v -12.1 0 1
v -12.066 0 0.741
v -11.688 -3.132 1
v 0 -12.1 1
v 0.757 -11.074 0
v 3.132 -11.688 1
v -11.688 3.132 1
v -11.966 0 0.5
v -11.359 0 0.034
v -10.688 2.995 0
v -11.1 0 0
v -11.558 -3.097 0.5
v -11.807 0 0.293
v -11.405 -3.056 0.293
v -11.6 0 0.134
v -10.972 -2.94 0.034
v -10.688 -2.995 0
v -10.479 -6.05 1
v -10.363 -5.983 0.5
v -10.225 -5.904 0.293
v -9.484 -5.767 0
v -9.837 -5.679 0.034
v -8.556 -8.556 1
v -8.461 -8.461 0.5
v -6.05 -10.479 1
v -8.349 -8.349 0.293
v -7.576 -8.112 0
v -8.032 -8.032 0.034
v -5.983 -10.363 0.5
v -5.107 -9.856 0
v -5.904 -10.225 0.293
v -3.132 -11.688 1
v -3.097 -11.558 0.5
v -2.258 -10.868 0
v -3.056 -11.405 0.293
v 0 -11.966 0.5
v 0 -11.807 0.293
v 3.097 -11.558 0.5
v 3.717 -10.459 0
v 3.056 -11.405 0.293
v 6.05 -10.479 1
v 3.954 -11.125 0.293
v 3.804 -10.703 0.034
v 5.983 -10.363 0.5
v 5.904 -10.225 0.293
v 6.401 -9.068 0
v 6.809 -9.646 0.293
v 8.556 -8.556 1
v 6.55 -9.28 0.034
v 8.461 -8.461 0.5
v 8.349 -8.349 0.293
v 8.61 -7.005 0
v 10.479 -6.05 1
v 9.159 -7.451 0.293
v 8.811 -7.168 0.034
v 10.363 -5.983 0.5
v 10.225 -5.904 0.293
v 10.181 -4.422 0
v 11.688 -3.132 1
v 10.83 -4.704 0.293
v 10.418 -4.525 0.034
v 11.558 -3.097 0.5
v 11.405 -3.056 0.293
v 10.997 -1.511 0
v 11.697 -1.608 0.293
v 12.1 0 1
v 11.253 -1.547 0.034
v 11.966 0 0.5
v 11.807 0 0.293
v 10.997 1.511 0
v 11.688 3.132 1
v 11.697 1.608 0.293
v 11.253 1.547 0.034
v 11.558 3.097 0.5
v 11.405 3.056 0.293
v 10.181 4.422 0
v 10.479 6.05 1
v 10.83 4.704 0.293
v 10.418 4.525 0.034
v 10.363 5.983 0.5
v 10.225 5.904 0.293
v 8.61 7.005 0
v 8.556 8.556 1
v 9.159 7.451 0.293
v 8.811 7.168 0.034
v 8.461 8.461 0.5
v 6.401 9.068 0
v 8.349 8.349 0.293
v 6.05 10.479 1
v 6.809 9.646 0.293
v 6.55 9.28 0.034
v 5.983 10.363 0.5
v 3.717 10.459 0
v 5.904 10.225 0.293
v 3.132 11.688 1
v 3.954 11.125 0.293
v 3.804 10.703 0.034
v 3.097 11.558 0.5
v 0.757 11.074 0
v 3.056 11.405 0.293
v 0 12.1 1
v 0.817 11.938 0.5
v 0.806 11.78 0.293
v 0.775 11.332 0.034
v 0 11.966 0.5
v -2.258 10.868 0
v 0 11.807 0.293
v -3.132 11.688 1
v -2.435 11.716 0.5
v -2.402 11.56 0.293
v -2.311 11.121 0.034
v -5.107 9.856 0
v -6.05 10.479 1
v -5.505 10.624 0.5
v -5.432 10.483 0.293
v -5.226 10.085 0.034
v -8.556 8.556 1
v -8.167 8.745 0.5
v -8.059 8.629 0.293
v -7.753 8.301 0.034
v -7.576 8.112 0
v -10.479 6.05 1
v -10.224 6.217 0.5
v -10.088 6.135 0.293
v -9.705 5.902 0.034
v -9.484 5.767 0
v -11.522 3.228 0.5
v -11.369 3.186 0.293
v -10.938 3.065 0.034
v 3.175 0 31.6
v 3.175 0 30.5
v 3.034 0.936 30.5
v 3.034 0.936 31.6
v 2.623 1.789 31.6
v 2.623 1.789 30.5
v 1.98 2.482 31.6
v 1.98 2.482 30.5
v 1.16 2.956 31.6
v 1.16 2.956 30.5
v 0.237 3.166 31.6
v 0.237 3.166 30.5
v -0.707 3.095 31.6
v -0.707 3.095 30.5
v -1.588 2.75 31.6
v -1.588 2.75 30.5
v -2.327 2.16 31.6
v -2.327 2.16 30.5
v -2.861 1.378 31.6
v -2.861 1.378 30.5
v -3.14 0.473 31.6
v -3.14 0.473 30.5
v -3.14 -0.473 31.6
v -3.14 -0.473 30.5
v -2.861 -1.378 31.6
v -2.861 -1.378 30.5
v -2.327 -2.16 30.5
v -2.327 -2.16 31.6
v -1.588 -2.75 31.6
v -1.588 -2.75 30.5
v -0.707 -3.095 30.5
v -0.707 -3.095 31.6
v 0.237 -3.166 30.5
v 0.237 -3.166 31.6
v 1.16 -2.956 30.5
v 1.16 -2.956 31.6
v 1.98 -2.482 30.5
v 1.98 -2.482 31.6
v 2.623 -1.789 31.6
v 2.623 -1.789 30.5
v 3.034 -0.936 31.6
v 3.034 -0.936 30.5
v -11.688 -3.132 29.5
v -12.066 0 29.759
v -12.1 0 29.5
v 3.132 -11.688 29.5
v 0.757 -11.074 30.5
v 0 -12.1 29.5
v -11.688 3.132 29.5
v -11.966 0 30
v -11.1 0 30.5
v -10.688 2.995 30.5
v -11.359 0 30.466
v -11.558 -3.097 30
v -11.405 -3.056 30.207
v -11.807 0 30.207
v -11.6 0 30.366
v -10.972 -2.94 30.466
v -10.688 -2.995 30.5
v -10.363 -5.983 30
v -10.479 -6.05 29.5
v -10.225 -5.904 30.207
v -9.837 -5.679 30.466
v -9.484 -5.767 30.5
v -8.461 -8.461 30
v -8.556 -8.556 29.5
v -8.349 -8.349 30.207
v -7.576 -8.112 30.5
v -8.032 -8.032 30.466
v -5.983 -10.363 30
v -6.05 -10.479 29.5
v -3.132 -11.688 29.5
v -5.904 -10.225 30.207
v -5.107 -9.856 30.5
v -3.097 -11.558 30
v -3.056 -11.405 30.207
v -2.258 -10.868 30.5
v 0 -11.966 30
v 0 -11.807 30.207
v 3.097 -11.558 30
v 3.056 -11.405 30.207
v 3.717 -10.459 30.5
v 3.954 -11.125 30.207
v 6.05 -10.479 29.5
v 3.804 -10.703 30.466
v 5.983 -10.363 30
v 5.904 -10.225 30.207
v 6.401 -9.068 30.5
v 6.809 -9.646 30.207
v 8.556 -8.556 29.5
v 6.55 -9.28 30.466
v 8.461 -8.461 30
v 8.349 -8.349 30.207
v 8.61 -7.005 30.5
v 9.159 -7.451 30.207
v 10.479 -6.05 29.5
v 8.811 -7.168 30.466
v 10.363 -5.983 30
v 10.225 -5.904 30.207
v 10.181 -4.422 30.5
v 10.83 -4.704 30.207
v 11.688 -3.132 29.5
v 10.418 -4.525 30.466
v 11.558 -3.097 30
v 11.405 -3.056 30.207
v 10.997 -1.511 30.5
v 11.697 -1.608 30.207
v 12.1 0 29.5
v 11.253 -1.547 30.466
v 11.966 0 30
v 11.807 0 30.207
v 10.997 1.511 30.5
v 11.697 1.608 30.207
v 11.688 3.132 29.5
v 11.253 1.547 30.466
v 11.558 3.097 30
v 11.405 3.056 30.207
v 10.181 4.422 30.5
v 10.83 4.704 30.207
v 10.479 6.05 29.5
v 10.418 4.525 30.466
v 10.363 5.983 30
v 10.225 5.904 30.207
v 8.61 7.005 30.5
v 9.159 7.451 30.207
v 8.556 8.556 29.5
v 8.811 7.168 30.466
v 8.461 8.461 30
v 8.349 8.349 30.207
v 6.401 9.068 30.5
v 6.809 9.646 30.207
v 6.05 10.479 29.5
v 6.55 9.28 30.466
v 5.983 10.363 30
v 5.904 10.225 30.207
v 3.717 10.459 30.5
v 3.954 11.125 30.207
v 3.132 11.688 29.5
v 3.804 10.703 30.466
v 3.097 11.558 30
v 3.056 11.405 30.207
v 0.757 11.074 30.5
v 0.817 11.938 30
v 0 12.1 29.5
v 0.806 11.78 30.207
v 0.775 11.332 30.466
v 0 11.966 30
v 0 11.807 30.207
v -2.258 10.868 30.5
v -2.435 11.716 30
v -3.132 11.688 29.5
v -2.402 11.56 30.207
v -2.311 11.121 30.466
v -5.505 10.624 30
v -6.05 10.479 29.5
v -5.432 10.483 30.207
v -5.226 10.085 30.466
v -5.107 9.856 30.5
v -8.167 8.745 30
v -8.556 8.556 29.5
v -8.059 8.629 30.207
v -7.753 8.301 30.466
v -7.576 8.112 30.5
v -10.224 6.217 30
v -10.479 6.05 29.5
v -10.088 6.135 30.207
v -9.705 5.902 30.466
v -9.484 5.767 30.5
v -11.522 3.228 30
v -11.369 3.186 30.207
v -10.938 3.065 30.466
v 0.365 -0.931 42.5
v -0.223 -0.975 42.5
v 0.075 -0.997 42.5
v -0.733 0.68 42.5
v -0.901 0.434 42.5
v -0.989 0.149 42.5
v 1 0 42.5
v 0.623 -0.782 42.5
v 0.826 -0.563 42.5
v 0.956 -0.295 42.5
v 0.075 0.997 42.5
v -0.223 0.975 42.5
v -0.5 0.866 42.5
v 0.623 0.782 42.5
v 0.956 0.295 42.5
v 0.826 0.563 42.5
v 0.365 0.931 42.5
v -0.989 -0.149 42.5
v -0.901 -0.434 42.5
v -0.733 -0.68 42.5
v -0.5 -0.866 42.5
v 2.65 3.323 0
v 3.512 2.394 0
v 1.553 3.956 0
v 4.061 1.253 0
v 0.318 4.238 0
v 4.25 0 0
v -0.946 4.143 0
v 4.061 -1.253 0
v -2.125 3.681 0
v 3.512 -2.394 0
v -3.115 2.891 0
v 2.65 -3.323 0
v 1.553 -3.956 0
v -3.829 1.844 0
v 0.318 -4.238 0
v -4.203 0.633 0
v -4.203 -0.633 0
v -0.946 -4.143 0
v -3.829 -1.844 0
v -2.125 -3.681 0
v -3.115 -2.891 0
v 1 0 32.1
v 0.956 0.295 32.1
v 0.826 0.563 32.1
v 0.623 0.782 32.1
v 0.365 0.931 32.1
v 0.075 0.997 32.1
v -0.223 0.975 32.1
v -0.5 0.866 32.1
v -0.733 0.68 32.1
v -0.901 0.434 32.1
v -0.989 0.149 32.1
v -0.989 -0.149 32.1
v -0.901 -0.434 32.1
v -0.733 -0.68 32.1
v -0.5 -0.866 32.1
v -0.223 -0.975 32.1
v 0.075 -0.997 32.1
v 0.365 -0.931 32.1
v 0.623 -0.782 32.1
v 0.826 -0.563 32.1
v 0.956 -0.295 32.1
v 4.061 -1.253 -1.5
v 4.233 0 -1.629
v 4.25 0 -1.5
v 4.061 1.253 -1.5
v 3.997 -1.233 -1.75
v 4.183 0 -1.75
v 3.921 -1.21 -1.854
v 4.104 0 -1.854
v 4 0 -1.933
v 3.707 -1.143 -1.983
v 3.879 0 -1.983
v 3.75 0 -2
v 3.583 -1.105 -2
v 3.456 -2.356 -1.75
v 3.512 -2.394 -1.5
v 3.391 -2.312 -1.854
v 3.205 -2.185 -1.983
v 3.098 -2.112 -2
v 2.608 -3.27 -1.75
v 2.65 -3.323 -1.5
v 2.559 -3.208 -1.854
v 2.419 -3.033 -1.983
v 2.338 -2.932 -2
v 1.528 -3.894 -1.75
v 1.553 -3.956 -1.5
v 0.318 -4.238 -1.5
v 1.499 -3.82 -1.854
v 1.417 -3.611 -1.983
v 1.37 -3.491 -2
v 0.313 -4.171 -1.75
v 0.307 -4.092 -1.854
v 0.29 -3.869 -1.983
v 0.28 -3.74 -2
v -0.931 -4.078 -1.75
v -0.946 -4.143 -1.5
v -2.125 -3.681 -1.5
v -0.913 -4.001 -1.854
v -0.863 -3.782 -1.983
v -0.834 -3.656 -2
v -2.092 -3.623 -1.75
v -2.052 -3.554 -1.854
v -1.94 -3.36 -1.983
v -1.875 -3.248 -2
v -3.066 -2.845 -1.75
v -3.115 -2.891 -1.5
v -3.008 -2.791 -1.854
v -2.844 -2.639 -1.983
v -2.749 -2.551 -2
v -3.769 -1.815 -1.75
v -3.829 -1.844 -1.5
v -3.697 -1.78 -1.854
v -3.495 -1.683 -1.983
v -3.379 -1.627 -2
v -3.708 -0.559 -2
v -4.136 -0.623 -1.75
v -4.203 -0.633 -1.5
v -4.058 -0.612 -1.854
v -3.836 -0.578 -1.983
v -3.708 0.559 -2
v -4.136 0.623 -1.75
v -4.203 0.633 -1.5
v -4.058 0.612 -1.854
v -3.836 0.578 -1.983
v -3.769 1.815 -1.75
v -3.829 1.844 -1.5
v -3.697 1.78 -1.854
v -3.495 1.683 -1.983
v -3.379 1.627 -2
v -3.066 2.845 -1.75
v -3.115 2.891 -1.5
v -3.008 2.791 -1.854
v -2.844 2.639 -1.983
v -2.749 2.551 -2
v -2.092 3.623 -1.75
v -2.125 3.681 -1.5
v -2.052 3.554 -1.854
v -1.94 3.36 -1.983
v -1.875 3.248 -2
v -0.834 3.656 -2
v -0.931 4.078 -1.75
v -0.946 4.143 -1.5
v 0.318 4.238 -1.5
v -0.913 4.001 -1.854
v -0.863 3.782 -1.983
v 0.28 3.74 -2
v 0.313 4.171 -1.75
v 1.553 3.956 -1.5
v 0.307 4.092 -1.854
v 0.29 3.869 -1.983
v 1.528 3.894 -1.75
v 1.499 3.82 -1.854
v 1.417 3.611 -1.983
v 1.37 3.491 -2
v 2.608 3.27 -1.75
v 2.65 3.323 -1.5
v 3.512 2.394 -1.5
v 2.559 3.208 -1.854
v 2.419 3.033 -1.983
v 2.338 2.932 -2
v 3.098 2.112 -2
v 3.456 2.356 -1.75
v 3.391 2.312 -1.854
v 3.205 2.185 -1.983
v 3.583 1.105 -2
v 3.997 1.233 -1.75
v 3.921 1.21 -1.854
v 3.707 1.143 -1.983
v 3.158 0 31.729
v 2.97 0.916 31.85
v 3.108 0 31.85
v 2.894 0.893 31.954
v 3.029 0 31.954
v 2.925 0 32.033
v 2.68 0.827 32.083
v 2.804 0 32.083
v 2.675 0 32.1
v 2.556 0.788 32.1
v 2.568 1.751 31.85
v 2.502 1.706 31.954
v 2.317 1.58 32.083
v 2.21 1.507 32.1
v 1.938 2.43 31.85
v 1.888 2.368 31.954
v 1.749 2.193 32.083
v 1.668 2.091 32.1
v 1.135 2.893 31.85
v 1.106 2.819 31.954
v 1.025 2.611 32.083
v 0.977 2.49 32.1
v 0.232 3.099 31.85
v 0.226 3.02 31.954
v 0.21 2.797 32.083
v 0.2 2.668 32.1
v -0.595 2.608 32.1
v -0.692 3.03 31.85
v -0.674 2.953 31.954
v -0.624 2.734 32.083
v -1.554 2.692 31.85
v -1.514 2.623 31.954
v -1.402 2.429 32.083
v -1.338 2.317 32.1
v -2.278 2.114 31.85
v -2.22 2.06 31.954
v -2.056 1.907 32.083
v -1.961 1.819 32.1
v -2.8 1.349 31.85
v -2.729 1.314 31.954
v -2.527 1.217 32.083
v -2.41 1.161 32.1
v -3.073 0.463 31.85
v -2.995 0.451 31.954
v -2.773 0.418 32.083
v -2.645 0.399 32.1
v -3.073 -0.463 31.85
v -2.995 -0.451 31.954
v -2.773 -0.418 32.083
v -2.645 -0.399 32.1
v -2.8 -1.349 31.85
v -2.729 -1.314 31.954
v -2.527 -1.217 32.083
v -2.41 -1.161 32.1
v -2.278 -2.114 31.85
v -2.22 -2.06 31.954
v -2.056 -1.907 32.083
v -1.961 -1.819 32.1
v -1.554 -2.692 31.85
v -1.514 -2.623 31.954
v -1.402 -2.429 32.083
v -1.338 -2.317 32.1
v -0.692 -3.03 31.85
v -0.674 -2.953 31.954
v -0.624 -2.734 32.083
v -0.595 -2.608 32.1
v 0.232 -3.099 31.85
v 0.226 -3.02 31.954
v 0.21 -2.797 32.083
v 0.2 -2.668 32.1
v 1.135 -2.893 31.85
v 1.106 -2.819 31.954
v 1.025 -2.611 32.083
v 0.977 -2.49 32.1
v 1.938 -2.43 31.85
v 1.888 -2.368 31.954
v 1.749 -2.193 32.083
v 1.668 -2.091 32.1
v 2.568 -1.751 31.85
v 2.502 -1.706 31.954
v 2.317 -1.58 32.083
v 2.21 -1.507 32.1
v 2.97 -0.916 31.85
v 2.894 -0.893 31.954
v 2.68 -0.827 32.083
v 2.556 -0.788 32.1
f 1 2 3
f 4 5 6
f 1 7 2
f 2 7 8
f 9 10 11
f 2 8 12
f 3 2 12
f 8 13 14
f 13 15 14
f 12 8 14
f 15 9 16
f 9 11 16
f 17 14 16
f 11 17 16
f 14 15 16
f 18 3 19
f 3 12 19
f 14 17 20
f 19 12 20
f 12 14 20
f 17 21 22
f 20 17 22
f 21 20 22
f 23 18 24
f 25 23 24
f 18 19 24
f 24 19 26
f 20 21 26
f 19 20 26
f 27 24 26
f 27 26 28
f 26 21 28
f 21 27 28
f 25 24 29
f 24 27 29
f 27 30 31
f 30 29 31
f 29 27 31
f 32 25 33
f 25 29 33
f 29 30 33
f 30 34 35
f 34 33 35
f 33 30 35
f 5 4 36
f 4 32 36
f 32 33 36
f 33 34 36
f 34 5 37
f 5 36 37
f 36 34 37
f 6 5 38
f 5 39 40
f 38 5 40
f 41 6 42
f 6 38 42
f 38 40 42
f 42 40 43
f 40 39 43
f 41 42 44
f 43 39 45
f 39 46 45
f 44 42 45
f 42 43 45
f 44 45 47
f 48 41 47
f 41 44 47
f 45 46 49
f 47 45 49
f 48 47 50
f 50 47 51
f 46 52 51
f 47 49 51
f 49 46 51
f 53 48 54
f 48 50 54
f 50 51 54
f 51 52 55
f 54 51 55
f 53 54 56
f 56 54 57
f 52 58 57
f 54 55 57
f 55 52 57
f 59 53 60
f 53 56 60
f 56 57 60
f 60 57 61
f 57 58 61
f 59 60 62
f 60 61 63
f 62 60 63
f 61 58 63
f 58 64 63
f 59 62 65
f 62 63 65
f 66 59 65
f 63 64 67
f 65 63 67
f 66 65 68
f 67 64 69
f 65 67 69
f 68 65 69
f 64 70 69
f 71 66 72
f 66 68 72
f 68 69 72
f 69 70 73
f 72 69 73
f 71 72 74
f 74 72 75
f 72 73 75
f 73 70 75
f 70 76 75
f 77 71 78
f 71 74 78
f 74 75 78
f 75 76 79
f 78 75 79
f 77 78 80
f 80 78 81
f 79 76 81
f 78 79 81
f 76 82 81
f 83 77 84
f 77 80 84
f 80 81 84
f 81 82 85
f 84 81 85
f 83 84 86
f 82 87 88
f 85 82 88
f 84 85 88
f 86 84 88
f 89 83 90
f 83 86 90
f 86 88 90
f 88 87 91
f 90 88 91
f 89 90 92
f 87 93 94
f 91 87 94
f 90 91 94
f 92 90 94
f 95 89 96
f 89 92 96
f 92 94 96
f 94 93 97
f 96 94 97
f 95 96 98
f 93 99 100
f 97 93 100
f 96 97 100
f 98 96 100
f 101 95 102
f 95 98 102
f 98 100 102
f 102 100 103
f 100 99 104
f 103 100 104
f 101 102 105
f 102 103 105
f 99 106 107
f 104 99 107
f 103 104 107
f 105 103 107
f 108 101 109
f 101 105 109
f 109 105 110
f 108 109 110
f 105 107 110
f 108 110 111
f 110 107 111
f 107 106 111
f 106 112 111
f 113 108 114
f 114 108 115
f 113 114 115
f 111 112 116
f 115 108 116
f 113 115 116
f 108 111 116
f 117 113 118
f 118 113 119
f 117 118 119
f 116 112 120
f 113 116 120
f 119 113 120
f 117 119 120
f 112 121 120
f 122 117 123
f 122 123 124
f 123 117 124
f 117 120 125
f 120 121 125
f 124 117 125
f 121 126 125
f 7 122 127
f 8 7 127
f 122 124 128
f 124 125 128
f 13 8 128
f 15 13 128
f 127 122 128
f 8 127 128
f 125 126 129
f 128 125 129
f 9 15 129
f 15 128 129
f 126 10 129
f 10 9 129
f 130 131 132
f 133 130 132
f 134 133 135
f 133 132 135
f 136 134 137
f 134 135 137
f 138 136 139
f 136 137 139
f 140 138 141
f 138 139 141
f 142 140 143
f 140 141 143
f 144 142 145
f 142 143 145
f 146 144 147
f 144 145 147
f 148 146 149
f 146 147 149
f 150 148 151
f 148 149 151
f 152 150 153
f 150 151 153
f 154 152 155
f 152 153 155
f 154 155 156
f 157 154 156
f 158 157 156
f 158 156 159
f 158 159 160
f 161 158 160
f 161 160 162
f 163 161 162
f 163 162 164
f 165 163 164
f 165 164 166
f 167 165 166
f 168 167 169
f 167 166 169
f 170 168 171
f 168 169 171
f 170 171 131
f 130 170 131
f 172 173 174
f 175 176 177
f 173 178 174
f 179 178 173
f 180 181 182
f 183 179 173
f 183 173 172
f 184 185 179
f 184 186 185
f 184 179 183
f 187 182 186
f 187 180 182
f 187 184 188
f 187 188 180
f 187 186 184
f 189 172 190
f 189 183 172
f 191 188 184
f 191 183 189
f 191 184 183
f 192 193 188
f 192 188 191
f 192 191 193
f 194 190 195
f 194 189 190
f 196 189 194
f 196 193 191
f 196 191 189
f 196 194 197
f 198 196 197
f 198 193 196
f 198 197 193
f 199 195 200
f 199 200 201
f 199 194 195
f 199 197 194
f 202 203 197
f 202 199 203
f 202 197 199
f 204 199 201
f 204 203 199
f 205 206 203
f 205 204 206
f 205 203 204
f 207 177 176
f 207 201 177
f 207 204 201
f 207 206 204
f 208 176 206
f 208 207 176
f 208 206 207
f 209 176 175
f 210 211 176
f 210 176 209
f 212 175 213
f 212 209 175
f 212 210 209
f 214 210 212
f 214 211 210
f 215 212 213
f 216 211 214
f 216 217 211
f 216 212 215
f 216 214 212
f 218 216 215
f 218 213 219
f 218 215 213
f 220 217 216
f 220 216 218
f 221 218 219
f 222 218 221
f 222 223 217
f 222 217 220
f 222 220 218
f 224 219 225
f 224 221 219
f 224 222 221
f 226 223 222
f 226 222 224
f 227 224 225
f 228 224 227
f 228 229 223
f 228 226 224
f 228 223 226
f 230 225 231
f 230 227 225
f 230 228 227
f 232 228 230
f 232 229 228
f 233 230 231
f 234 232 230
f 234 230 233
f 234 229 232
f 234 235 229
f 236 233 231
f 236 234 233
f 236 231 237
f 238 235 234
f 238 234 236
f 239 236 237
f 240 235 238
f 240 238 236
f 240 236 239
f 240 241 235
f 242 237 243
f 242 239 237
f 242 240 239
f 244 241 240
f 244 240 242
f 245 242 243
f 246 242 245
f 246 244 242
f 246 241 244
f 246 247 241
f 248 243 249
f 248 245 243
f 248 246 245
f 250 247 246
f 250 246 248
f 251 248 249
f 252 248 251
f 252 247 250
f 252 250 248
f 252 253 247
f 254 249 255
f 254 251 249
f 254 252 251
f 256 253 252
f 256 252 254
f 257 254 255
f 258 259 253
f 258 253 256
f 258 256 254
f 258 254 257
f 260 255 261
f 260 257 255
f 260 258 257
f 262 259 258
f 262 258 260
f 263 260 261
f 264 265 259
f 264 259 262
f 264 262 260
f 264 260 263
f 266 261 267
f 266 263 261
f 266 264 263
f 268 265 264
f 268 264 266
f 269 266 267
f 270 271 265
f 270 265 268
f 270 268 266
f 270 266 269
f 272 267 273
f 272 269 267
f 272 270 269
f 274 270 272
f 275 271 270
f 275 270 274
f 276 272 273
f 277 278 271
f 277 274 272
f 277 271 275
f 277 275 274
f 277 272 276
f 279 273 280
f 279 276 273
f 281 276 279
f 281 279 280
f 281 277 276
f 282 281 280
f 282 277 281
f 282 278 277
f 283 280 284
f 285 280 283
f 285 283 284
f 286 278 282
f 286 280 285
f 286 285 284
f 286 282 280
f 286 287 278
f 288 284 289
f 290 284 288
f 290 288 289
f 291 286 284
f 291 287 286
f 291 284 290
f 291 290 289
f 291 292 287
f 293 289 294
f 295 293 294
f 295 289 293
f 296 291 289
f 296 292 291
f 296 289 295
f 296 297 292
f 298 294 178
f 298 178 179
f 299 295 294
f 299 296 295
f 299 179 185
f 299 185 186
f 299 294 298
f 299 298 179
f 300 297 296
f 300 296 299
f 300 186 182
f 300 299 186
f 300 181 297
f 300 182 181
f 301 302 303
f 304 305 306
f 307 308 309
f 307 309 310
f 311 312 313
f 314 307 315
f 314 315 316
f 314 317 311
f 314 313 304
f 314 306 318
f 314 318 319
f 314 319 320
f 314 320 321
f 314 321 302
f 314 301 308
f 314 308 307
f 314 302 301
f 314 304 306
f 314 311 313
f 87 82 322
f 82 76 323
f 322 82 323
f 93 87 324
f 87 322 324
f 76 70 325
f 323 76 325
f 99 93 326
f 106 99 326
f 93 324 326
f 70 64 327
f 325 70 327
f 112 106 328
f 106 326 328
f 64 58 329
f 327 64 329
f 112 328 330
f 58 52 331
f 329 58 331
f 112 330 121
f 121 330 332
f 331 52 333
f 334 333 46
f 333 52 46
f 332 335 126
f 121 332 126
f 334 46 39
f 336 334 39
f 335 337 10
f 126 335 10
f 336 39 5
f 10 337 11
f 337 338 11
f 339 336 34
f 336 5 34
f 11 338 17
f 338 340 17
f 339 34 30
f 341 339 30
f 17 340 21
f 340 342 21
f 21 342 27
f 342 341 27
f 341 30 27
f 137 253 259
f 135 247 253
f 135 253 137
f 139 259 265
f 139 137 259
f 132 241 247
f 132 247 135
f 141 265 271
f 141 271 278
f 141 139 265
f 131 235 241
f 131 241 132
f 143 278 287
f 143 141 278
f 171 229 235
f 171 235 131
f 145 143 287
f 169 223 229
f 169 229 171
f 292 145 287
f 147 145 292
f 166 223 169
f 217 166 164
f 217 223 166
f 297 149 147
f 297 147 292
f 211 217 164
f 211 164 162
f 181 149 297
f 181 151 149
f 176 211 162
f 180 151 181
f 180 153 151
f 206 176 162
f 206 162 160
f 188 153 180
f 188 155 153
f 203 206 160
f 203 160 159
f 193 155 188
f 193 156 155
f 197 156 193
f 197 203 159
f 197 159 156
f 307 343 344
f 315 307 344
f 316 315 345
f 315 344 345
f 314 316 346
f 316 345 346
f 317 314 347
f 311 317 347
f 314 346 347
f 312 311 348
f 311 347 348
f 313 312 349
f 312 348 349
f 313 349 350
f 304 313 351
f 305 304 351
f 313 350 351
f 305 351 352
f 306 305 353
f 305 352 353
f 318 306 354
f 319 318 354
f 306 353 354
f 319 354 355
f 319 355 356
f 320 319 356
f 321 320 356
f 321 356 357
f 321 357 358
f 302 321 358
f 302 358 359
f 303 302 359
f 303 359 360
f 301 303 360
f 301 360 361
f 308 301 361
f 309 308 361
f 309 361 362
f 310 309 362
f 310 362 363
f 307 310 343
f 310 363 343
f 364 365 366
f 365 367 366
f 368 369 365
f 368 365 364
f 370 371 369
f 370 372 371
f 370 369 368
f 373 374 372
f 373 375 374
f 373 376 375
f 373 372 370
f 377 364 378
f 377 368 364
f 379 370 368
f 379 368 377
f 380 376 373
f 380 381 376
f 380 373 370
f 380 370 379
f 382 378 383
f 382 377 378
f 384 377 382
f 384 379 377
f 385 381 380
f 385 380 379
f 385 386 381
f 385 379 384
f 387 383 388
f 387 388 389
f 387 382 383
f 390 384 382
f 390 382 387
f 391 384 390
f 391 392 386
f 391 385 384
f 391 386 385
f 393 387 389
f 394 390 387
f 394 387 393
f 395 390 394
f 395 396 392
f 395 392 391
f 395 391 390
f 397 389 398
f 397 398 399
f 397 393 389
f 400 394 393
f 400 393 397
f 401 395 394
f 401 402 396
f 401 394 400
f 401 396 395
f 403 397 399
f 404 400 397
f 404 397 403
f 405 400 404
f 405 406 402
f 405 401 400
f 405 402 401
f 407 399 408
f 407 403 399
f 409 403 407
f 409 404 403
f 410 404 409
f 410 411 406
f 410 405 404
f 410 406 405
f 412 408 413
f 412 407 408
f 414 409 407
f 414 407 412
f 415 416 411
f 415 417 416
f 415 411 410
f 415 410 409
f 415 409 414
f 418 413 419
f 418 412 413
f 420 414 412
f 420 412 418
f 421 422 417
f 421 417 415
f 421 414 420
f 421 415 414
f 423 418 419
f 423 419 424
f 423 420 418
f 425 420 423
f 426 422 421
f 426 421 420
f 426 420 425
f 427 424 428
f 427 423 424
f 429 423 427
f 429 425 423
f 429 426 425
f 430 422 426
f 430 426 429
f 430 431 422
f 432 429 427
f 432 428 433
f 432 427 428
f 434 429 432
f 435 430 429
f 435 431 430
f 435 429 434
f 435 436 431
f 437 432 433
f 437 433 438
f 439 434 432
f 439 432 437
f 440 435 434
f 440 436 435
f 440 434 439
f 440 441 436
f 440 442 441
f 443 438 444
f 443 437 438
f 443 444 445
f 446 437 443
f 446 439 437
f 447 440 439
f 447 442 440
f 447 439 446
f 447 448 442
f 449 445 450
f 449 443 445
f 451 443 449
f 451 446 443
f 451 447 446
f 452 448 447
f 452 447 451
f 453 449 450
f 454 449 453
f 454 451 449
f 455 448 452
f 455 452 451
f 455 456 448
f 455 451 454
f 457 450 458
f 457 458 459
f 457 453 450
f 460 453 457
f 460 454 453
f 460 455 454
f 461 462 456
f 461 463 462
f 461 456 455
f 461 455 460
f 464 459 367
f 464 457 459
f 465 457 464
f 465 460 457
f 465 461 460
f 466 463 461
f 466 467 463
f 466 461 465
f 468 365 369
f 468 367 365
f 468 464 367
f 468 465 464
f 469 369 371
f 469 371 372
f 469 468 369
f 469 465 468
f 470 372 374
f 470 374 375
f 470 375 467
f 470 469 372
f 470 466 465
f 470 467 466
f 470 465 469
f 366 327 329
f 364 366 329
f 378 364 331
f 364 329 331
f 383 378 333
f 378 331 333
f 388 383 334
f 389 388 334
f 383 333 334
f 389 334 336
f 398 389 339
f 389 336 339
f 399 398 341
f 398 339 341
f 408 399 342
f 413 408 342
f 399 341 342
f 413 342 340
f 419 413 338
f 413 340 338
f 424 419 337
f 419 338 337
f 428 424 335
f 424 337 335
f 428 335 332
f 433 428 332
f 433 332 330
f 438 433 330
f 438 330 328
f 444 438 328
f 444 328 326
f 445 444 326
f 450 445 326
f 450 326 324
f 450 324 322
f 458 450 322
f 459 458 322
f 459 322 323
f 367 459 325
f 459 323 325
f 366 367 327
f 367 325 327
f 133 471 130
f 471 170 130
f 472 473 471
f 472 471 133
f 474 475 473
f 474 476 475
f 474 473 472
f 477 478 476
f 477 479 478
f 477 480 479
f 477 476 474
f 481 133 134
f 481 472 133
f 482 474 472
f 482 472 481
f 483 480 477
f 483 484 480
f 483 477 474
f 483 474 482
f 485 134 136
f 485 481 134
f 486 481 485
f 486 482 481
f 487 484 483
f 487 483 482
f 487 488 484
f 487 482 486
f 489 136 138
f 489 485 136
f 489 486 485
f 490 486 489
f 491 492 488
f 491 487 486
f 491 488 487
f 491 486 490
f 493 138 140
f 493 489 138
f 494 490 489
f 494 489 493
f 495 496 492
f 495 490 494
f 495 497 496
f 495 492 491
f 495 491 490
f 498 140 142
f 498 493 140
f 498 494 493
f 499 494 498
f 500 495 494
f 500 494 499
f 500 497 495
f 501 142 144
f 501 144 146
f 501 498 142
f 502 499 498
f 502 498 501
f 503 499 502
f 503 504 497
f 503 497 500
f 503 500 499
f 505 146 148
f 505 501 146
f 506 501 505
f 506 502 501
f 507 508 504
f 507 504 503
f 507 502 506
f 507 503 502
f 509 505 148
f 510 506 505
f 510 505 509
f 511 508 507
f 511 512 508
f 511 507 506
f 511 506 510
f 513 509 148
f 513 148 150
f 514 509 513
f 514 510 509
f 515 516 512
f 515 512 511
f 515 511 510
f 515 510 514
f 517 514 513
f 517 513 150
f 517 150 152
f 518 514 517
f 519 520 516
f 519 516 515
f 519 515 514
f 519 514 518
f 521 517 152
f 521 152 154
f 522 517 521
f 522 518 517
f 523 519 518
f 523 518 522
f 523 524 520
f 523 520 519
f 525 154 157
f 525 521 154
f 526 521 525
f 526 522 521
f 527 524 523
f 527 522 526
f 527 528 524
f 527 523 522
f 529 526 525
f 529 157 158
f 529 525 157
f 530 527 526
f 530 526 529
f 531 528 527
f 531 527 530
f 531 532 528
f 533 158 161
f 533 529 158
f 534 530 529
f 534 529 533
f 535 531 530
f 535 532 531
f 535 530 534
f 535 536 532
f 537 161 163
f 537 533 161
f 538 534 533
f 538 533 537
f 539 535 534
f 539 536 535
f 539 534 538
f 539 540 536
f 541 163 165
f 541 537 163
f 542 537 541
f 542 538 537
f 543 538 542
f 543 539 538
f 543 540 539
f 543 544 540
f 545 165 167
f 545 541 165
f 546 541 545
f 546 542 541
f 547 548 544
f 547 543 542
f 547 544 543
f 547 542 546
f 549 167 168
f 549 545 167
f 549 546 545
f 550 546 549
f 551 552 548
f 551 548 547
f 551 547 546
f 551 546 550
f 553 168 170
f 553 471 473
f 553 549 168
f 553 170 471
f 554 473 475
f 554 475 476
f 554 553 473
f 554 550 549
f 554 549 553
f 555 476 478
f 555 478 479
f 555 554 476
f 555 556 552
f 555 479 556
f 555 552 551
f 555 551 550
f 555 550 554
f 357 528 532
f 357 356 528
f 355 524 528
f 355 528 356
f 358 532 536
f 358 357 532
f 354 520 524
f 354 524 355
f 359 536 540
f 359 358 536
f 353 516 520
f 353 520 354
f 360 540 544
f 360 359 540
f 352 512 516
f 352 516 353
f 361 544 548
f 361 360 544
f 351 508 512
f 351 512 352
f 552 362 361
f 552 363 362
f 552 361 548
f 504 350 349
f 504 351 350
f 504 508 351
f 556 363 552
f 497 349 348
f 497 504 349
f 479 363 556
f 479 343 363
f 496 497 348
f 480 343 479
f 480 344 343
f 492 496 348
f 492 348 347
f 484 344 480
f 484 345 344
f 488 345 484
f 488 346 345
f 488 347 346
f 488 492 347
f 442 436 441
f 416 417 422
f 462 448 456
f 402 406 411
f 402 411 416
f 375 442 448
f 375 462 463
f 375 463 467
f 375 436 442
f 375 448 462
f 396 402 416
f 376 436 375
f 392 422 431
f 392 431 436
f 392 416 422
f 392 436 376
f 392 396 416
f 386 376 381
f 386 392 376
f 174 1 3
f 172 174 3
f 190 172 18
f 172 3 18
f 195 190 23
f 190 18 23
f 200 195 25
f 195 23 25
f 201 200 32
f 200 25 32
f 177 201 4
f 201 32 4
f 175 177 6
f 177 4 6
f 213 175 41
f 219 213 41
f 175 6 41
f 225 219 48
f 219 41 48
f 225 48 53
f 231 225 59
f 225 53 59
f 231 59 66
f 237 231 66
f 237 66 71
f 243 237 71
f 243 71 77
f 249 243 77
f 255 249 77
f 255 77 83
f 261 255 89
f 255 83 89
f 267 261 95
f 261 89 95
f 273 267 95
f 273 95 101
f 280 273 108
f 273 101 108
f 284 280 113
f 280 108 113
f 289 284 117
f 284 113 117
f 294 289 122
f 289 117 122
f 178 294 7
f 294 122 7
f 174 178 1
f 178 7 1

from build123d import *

# Parameters (mm, degrees)
SKETCH1_R           = 12.1
BOSS_EXTRUDE1_DEPTH = 30.5
SKETCH2_R           = 3.175
BOSS_EXTRUDE2_DEPTH = 1.6
SKETCH3_R           = 1
BOSS_EXTRUDE3_DEPTH = 10.4
SKETCH4_R           = 4.25
BOSS_EXTRUDE4_DEPTH = 2
FILLET1_R           = 1
FILLET2_R           = 0.5


with BuildPart() as part:
    # Sketch1 → Boss-Extrude1 (new body)
    with BuildSketch(Plane.XY):
        with Locations(Location((0, 0, 0), (0, 0, 180))):
            Circle(SKETCH1_R)
    extrude(amount=BOSS_EXTRUDE1_DEPTH)

    # Sketch2 → Boss-Extrude2 (add)
    with BuildSketch(Plane.XY.offset(30.5)):
        Circle(SKETCH2_R)
    extrude(amount=BOSS_EXTRUDE2_DEPTH)

    # Sketch3 → Boss-Extrude3 (add)
    with BuildSketch(Plane.XY.offset(32.1)):
        Circle(SKETCH3_R)
    extrude(amount=BOSS_EXTRUDE3_DEPTH)

    # Sketch4 → Boss-Extrude4 (add)
    with BuildSketch(Plane(origin=(0, 0, 0), x_dir=(-1, 0, 0), z_dir=(0, 0, -1))):
        with Locations(Location((0, 0, 0), (0, 0, 180))):
            Circle(SKETCH4_R)
    extrude(amount=BOSS_EXTRUDE4_DEPTH)

    # Fillet1
    fillet1_edges = [part.edges().sort_by_distance(p)[0] for p in [
        (12.1, 0, 0),
        (12.1, 0, 30.5),
    ]]
    fillet(fillet1_edges, radius=FILLET1_R)

    # Fillet2
    fillet2_edges = [part.edges().sort_by_distance(p)[0] for p in [
        (-4.25, 0, -2),
        (-3.175, 0, 32.1),
    ]]
    fillet(fillet2_edges, radius=FILLET2_R)


solid = part.part
